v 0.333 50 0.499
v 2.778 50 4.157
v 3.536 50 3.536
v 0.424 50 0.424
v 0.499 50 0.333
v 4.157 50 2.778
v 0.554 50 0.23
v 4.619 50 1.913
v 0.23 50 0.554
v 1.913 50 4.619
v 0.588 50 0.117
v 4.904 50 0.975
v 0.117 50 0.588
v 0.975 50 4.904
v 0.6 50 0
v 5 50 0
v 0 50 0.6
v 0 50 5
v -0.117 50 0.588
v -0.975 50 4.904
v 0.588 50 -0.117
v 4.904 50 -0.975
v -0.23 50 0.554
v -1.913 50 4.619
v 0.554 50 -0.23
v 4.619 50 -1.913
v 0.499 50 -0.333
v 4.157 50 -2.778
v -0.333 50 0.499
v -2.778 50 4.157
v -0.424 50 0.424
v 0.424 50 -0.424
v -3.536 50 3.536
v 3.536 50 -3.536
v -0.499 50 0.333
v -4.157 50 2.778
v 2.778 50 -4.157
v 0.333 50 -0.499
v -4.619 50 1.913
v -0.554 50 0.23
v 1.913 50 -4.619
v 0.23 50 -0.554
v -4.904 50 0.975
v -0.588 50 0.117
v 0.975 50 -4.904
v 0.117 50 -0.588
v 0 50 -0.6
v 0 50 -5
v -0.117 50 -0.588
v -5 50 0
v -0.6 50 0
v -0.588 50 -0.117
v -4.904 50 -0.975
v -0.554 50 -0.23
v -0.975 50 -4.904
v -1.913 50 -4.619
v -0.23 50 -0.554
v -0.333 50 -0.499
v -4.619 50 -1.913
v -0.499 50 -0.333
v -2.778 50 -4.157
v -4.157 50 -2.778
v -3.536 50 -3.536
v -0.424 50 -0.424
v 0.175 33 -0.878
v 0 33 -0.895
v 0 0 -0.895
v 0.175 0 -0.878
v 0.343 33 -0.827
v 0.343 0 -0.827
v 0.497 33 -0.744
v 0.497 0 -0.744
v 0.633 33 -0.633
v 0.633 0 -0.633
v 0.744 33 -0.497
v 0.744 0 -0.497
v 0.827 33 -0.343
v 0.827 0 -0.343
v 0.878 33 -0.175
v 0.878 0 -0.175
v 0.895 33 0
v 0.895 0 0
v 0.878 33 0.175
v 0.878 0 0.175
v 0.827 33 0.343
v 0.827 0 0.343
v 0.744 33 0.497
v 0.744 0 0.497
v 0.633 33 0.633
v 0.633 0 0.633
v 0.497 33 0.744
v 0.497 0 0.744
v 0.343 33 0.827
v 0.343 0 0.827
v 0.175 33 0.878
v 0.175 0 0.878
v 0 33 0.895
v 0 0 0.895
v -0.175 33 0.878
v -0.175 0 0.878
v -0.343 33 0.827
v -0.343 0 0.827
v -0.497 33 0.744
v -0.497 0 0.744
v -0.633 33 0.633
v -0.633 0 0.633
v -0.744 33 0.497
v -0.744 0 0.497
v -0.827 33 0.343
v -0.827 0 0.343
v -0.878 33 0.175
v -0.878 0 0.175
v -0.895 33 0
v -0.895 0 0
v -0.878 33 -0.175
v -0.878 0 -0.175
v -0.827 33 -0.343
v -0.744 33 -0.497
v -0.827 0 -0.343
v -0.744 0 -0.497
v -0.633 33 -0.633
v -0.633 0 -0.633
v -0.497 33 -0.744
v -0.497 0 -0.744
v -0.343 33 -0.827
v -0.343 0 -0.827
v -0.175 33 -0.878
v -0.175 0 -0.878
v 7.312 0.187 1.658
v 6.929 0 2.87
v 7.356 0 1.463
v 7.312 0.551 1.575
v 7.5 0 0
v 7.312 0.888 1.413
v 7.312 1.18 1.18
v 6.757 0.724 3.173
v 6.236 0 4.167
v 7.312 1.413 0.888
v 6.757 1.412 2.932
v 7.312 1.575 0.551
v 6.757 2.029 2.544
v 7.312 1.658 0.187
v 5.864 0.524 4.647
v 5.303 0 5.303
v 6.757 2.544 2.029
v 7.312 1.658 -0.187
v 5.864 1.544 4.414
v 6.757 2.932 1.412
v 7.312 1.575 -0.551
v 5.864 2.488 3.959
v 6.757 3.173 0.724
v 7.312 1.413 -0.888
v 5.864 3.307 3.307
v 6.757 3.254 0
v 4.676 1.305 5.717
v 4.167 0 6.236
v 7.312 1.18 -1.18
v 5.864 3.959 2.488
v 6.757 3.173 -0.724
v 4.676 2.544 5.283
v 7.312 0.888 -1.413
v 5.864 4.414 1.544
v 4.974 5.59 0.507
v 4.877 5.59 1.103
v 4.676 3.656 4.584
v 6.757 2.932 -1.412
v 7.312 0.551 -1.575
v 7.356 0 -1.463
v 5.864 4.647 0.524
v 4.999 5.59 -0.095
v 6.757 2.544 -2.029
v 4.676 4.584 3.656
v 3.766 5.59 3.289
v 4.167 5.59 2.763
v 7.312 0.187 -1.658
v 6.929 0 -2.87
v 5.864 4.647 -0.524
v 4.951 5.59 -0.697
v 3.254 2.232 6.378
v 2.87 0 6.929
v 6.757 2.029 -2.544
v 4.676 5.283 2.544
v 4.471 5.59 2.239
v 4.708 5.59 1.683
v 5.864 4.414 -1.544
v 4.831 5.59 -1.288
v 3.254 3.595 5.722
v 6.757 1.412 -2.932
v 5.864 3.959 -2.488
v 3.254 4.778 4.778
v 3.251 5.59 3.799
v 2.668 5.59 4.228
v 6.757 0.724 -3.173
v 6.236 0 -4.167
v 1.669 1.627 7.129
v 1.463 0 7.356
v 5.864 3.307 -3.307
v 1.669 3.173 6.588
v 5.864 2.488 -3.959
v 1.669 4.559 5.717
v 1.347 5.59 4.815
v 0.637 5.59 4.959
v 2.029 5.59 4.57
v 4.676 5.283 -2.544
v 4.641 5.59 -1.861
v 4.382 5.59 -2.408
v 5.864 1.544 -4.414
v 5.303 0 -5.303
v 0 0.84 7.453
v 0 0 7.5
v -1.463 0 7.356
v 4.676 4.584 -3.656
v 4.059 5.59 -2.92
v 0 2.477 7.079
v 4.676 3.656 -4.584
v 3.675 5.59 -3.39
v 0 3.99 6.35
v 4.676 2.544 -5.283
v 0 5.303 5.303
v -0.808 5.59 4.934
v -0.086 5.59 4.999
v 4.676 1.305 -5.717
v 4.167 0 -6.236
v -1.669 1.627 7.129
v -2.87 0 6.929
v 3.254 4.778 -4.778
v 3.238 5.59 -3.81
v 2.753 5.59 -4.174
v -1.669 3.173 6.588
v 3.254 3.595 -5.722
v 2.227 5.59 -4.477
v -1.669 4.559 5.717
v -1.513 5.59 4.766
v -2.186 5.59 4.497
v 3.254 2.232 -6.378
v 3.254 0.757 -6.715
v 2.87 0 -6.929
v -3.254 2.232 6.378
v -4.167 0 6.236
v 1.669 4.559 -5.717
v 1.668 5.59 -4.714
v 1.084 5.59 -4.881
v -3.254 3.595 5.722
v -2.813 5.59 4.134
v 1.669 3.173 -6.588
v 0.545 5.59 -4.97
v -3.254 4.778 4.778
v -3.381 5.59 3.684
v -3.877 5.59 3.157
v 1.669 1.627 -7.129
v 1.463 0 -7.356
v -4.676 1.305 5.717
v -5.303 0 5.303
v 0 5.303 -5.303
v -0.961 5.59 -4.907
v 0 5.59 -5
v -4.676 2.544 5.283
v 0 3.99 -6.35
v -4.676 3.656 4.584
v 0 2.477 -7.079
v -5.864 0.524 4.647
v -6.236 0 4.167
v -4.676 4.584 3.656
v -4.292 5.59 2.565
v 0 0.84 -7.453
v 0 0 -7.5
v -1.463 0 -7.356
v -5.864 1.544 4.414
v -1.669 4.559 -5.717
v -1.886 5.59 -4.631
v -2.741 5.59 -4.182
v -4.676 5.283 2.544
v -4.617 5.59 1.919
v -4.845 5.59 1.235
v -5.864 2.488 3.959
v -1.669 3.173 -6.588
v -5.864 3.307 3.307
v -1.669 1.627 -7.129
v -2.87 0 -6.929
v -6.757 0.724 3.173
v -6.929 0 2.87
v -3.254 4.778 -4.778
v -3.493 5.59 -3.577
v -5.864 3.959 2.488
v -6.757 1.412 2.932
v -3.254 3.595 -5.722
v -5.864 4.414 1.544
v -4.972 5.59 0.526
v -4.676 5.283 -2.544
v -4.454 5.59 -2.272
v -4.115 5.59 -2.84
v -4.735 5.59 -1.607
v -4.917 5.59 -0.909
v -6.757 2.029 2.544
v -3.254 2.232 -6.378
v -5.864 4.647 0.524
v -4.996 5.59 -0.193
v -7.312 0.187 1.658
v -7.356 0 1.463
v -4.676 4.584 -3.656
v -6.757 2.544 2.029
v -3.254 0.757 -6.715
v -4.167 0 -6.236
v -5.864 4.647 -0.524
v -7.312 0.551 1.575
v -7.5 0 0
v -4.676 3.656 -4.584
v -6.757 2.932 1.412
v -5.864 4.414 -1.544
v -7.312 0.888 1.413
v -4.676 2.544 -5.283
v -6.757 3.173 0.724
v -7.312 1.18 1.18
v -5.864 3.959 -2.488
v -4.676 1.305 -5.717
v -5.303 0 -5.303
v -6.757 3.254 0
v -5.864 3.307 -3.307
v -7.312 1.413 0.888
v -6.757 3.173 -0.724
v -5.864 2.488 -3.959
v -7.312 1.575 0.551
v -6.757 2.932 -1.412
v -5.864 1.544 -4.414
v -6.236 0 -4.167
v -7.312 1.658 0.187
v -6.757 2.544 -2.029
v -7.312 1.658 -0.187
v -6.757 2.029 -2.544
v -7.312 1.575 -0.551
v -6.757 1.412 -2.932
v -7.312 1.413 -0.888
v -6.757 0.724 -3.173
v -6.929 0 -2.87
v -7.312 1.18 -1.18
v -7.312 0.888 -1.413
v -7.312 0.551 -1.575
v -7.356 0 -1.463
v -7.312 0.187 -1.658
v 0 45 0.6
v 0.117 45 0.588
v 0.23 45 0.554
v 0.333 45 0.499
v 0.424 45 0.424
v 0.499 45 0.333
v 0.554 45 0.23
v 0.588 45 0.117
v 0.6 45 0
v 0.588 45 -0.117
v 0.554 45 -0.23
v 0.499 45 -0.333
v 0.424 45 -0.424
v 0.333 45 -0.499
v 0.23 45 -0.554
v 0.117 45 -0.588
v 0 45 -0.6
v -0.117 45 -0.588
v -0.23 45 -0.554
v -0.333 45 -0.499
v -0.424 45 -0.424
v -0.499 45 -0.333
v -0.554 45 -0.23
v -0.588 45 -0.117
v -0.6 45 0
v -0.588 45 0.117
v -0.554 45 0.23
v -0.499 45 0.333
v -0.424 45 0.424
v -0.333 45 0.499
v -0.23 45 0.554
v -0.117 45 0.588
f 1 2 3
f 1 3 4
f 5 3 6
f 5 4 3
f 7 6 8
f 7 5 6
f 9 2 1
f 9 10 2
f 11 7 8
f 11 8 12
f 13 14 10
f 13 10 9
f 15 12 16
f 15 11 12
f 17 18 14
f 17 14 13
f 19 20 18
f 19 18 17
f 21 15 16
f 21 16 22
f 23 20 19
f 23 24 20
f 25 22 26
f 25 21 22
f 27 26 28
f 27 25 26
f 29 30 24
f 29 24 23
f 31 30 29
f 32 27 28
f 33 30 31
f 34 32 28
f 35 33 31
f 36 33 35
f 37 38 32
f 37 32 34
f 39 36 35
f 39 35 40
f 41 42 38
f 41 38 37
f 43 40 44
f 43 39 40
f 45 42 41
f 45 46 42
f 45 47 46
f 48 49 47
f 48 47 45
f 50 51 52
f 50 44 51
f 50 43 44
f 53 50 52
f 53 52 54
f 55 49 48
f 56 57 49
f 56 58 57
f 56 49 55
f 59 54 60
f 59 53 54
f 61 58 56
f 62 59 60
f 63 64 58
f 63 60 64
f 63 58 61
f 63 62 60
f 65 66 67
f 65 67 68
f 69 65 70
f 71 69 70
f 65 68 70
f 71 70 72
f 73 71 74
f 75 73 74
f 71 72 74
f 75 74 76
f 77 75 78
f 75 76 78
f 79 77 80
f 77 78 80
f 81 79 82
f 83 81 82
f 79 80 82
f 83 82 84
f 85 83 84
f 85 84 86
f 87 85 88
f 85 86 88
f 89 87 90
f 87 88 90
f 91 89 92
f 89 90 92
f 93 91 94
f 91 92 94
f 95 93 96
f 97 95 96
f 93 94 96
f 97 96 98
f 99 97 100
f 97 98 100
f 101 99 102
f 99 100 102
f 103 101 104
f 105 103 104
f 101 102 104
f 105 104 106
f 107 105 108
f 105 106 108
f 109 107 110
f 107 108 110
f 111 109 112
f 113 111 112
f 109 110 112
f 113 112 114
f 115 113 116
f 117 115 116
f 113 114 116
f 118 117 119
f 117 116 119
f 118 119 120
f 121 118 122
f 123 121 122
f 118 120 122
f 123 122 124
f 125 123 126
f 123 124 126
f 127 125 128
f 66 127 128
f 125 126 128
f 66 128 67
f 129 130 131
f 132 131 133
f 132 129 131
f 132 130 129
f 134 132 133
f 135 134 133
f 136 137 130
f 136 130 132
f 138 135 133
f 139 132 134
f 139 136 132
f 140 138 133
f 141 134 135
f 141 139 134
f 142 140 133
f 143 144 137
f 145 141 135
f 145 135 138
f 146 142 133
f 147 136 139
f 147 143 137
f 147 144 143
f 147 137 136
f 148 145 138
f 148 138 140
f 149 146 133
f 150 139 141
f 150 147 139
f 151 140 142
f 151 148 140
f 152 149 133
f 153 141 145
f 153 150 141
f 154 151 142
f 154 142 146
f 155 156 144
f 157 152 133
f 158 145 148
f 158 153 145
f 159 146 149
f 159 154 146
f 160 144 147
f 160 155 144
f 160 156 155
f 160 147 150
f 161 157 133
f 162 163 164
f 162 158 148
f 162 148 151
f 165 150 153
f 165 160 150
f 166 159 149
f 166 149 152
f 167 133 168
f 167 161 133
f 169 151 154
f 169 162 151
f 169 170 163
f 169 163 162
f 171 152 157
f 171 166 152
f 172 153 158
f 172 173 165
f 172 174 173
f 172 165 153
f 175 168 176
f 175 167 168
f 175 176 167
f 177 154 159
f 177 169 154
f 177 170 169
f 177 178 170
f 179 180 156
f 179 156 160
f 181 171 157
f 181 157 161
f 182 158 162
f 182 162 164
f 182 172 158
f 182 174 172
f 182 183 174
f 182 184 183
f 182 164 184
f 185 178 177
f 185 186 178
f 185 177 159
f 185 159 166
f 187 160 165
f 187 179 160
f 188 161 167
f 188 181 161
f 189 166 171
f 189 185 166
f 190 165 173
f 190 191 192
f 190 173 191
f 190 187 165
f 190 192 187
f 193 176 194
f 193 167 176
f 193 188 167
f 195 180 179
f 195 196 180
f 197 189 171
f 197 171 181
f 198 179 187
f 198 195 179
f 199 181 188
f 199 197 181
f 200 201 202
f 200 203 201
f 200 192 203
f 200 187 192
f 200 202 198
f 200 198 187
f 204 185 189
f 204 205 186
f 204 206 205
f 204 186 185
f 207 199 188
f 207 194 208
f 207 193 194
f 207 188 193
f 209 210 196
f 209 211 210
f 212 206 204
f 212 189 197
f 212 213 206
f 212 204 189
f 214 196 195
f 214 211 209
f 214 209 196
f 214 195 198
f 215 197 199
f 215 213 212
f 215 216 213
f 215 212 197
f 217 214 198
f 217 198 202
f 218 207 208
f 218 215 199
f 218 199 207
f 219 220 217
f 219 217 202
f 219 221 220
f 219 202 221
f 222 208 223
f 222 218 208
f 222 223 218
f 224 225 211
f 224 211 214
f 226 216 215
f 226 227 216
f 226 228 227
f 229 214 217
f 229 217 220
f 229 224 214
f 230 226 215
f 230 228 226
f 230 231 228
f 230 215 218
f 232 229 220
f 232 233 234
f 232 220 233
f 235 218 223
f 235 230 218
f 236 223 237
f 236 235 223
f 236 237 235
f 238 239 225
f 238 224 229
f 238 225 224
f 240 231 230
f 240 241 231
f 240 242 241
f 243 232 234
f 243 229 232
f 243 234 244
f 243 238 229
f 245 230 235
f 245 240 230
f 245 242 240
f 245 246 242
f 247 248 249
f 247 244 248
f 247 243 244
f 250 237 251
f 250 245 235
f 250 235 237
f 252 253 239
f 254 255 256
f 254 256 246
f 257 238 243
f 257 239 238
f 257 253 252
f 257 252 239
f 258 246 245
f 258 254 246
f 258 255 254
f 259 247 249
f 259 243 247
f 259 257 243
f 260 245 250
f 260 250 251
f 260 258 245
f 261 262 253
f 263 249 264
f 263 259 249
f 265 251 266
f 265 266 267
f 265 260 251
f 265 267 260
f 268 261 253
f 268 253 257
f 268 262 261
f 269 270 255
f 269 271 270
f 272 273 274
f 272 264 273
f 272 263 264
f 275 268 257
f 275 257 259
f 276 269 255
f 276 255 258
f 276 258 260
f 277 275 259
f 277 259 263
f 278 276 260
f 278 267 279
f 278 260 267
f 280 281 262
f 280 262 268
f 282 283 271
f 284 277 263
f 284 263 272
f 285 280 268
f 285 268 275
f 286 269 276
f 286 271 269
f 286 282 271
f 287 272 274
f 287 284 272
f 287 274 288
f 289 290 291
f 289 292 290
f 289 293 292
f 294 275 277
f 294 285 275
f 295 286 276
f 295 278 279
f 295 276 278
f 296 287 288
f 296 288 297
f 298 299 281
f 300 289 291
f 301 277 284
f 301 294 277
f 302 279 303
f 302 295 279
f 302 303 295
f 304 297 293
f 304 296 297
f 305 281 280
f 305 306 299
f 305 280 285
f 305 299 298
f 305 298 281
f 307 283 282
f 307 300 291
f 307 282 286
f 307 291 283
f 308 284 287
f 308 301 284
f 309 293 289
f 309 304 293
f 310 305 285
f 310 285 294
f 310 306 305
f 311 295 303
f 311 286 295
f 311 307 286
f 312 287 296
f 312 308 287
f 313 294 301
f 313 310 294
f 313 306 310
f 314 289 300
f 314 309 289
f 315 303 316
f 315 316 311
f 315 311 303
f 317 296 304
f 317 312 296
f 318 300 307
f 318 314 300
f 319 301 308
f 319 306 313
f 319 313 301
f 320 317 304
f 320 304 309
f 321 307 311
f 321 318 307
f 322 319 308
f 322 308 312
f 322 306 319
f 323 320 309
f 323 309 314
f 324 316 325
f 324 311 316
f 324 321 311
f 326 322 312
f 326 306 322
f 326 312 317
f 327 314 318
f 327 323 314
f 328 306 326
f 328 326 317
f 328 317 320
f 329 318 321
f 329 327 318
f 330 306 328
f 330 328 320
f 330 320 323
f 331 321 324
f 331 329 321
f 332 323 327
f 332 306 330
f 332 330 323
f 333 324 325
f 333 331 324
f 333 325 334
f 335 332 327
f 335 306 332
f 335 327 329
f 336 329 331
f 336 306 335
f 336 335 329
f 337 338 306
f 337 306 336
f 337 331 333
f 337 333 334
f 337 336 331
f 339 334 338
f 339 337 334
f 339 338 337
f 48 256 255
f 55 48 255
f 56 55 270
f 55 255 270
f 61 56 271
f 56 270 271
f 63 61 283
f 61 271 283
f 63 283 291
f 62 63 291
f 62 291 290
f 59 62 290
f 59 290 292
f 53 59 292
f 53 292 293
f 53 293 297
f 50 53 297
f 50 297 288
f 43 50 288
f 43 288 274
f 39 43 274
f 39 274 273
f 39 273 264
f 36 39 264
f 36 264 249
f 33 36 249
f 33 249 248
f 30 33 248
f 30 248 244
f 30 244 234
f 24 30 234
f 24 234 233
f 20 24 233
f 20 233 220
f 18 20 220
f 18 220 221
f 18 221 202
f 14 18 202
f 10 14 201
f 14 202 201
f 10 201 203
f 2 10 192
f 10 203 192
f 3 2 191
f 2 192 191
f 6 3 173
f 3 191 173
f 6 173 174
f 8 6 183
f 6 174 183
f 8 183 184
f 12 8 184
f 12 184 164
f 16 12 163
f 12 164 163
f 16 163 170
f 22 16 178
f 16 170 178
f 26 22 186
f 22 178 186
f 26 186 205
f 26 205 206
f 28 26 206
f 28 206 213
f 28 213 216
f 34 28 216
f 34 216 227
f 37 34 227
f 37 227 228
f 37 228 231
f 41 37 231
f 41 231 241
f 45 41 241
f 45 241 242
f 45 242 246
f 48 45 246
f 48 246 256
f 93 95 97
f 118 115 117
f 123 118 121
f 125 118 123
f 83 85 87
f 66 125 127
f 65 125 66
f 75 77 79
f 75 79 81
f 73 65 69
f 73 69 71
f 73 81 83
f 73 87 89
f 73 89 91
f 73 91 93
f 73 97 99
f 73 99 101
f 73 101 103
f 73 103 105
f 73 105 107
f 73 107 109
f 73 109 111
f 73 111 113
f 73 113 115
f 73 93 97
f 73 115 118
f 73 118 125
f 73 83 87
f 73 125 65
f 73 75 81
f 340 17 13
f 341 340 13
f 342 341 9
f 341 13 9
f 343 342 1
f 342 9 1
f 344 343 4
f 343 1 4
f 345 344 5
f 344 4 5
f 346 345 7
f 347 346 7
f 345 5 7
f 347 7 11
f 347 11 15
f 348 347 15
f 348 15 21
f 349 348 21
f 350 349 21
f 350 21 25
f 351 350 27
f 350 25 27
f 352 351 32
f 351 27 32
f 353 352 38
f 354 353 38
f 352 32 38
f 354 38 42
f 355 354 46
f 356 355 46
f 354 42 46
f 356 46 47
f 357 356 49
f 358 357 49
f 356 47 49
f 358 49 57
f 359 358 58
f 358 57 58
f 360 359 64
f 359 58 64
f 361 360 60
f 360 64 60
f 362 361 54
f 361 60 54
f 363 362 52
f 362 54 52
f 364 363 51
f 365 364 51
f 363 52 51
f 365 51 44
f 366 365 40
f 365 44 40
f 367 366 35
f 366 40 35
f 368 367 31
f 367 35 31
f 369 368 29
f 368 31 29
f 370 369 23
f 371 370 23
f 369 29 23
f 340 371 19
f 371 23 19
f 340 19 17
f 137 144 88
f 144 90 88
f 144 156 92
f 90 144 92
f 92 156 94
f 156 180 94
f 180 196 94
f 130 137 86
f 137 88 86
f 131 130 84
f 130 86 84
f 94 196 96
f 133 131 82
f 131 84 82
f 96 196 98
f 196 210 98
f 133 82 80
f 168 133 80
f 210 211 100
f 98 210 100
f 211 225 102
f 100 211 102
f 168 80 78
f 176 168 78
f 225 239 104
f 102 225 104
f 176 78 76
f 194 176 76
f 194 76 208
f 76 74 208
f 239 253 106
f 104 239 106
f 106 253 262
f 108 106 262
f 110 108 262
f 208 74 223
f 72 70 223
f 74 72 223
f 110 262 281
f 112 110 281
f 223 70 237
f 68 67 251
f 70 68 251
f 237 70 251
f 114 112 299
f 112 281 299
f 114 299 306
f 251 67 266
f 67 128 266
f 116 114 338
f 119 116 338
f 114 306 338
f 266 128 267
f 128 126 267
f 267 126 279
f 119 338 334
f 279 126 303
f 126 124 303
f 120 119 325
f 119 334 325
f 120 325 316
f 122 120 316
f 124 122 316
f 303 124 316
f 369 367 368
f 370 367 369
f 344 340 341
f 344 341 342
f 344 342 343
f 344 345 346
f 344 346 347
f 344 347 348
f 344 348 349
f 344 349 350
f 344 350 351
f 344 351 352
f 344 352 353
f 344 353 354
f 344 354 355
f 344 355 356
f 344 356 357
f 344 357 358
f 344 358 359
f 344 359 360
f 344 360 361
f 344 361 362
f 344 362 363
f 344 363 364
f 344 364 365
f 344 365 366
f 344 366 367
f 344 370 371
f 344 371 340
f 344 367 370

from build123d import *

# Parameters (mm, degrees)
CIRCULAR_BASE_ANGLE       = 180
CIYLINDRICAL_SUPPORT_R    = 5
CYLINDRICAL_SUPPORT_DEPTH = 50
SKETCH5_R                 = 0.6
PILOT_HOLE_DEPTH          = 5
SKETCH6_R                 = 0.895
BOTTOM_HOLE_DEPTH         = 33


with BuildPart() as part:
    # Sketch3 → Circular Base (revolve)
    with BuildSketch(Plane(origin=(0, 0, 0), x_dir=(1, 0, 0), z_dir=(0, 1, 0))):
        with BuildLine():
            Line((-7.5, 0), (7.5, 0))
            ThreePointArc((7.5, 0), (0, -7.5), (-7.5, 0))
        make_face()
    revolve(axis=Axis((-7.5, 0, 0), (-1, 0, 0)), revolution_arc=CIRCULAR_BASE_ANGLE)

    # Ciylindrical Support → Cylindrical Support (add)
    with BuildSketch(Plane(origin=(0, 0, 0), x_dir=(1, 0, 0), z_dir=(0, 1, 0))):
        with Locations(Location((0, 0, 0), (0, 0, 90))):
            Circle(CIYLINDRICAL_SUPPORT_R)
    extrude(amount=CYLINDRICAL_SUPPORT_DEPTH)

    # Sketch5 → Pilot Hole (cut)
    with BuildSketch(Plane(origin=(0, 50, 0), x_dir=(1, 0, 0), z_dir=(0, 1, 0))):
        with Locations(Location((0, 0, 0), (0, 0, 270))):
            Circle(SKETCH5_R)
    extrude(amount=-PILOT_HOLE_DEPTH, mode=Mode.SUBTRACT)

    # Sketch6 → Bottom Hole (cut)
    with BuildSketch(Plane.XZ):
        with Locations(Location((0, 0, 0), (0, 0, 270))):
            Circle(SKETCH6_R)
    extrude(amount=-BOTTOM_HOLE_DEPTH, mode=Mode.SUBTRACT)


solid = part.part
